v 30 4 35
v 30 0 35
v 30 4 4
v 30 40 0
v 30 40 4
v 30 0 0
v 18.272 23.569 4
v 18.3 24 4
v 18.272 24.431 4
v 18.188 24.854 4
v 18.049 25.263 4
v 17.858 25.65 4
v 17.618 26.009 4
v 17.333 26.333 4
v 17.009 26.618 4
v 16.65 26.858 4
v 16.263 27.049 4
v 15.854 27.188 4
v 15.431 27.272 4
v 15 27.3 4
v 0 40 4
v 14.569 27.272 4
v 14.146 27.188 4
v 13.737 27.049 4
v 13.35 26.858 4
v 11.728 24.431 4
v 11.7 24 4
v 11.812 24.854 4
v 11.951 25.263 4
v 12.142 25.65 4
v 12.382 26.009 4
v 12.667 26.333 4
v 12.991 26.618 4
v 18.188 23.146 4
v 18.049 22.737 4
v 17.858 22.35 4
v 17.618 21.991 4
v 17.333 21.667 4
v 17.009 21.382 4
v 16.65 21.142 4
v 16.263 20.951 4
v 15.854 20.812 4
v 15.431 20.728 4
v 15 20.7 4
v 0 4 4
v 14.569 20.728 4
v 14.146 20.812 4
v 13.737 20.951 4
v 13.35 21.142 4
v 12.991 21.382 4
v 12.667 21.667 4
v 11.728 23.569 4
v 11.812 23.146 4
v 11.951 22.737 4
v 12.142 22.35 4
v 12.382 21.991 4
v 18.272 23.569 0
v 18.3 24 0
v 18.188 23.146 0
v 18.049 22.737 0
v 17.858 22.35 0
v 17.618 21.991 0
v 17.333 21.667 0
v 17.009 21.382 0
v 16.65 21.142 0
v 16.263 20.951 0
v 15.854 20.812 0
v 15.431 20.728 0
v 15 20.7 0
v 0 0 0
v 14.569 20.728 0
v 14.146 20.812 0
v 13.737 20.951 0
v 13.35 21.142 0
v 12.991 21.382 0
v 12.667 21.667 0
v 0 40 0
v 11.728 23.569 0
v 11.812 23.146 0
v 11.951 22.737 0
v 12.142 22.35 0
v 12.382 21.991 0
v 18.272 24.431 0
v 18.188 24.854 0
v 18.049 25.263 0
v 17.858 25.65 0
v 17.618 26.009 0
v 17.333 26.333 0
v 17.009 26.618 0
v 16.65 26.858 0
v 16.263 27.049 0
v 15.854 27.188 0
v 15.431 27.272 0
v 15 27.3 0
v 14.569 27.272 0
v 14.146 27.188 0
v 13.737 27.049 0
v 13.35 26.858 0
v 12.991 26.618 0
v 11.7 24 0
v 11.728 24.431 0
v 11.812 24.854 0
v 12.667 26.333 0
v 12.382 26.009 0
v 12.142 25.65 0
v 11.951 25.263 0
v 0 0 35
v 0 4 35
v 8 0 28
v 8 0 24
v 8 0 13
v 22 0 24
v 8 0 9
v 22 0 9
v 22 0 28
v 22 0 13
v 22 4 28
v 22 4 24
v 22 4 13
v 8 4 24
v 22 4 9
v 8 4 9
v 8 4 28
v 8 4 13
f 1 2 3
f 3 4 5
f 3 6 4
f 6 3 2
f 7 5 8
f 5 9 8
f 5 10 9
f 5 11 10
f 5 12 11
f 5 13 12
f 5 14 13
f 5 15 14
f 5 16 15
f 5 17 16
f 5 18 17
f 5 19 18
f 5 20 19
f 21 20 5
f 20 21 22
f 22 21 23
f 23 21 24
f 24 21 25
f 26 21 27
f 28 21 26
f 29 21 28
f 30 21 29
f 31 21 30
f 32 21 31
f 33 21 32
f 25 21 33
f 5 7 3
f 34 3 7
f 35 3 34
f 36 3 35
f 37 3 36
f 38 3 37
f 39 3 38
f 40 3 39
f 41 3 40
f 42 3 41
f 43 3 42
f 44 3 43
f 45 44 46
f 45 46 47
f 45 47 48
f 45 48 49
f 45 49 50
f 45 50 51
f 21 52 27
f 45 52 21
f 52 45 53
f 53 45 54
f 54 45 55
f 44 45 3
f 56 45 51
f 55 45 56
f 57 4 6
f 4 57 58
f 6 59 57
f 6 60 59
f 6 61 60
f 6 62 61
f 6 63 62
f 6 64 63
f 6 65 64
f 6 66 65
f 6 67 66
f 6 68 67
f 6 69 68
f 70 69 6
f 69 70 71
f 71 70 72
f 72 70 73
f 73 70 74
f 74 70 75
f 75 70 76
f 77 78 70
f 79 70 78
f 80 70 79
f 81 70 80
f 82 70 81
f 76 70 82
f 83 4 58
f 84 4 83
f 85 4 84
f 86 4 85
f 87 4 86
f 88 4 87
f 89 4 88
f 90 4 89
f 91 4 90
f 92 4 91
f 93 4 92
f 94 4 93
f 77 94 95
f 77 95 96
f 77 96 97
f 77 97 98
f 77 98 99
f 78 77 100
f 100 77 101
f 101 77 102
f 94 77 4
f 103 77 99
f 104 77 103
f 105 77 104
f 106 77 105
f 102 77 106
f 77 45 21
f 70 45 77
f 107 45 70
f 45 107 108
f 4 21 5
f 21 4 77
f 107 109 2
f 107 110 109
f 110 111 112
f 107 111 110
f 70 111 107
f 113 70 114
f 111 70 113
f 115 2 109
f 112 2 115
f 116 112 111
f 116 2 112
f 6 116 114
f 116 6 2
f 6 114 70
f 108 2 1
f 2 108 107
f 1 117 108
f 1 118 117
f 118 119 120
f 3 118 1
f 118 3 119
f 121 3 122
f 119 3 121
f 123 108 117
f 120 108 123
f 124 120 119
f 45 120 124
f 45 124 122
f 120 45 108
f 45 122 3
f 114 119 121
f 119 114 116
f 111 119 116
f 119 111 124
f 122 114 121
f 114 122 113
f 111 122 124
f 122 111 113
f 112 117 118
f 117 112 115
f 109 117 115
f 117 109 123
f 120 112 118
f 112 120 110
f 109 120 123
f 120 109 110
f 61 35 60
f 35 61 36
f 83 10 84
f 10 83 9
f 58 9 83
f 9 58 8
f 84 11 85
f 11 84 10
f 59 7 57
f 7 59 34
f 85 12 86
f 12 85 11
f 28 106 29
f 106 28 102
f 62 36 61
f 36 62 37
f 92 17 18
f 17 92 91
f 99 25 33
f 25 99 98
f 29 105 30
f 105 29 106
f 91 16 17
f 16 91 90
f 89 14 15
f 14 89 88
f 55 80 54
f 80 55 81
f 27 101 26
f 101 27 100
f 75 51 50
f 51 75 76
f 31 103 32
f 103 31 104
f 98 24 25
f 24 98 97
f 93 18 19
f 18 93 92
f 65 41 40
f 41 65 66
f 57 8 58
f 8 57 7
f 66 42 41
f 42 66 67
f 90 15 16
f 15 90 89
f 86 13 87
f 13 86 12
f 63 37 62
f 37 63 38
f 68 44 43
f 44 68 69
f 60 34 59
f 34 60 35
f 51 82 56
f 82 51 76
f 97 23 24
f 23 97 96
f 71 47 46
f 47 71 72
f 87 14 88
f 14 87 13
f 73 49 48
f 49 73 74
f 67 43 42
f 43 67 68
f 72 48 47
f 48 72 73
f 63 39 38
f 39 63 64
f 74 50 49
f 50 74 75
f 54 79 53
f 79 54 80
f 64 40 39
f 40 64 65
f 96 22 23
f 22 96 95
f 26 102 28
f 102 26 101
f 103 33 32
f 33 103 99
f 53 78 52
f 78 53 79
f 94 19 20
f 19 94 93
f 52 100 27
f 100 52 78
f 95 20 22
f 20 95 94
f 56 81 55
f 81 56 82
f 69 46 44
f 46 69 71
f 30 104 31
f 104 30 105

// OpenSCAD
// Antenna bracket: L plate with a 6.6 mm hole for an SMA bulkhead (or 16 mm for SO-239) and
// slots for hose clamps / zip ties around a mast up to ~40 mm. CC0.
hole = 6.6; t = 4; w = 30;
$fn = 48;
difference() {
  union() { cube([w, 40, t]); cube([w, t, 35]); }
  translate([w / 2, 24, -1]) cylinder(d = hole, h = t + 2);
  for (z = [10, 25]) translate([-1, -1, z]) cube([w + 2, t + 2, 0]);
  for (z = [9, 24]) translate([w / 2 - 7, -1, z]) cube([14, t + 2, 4]);  // strap slots
}
